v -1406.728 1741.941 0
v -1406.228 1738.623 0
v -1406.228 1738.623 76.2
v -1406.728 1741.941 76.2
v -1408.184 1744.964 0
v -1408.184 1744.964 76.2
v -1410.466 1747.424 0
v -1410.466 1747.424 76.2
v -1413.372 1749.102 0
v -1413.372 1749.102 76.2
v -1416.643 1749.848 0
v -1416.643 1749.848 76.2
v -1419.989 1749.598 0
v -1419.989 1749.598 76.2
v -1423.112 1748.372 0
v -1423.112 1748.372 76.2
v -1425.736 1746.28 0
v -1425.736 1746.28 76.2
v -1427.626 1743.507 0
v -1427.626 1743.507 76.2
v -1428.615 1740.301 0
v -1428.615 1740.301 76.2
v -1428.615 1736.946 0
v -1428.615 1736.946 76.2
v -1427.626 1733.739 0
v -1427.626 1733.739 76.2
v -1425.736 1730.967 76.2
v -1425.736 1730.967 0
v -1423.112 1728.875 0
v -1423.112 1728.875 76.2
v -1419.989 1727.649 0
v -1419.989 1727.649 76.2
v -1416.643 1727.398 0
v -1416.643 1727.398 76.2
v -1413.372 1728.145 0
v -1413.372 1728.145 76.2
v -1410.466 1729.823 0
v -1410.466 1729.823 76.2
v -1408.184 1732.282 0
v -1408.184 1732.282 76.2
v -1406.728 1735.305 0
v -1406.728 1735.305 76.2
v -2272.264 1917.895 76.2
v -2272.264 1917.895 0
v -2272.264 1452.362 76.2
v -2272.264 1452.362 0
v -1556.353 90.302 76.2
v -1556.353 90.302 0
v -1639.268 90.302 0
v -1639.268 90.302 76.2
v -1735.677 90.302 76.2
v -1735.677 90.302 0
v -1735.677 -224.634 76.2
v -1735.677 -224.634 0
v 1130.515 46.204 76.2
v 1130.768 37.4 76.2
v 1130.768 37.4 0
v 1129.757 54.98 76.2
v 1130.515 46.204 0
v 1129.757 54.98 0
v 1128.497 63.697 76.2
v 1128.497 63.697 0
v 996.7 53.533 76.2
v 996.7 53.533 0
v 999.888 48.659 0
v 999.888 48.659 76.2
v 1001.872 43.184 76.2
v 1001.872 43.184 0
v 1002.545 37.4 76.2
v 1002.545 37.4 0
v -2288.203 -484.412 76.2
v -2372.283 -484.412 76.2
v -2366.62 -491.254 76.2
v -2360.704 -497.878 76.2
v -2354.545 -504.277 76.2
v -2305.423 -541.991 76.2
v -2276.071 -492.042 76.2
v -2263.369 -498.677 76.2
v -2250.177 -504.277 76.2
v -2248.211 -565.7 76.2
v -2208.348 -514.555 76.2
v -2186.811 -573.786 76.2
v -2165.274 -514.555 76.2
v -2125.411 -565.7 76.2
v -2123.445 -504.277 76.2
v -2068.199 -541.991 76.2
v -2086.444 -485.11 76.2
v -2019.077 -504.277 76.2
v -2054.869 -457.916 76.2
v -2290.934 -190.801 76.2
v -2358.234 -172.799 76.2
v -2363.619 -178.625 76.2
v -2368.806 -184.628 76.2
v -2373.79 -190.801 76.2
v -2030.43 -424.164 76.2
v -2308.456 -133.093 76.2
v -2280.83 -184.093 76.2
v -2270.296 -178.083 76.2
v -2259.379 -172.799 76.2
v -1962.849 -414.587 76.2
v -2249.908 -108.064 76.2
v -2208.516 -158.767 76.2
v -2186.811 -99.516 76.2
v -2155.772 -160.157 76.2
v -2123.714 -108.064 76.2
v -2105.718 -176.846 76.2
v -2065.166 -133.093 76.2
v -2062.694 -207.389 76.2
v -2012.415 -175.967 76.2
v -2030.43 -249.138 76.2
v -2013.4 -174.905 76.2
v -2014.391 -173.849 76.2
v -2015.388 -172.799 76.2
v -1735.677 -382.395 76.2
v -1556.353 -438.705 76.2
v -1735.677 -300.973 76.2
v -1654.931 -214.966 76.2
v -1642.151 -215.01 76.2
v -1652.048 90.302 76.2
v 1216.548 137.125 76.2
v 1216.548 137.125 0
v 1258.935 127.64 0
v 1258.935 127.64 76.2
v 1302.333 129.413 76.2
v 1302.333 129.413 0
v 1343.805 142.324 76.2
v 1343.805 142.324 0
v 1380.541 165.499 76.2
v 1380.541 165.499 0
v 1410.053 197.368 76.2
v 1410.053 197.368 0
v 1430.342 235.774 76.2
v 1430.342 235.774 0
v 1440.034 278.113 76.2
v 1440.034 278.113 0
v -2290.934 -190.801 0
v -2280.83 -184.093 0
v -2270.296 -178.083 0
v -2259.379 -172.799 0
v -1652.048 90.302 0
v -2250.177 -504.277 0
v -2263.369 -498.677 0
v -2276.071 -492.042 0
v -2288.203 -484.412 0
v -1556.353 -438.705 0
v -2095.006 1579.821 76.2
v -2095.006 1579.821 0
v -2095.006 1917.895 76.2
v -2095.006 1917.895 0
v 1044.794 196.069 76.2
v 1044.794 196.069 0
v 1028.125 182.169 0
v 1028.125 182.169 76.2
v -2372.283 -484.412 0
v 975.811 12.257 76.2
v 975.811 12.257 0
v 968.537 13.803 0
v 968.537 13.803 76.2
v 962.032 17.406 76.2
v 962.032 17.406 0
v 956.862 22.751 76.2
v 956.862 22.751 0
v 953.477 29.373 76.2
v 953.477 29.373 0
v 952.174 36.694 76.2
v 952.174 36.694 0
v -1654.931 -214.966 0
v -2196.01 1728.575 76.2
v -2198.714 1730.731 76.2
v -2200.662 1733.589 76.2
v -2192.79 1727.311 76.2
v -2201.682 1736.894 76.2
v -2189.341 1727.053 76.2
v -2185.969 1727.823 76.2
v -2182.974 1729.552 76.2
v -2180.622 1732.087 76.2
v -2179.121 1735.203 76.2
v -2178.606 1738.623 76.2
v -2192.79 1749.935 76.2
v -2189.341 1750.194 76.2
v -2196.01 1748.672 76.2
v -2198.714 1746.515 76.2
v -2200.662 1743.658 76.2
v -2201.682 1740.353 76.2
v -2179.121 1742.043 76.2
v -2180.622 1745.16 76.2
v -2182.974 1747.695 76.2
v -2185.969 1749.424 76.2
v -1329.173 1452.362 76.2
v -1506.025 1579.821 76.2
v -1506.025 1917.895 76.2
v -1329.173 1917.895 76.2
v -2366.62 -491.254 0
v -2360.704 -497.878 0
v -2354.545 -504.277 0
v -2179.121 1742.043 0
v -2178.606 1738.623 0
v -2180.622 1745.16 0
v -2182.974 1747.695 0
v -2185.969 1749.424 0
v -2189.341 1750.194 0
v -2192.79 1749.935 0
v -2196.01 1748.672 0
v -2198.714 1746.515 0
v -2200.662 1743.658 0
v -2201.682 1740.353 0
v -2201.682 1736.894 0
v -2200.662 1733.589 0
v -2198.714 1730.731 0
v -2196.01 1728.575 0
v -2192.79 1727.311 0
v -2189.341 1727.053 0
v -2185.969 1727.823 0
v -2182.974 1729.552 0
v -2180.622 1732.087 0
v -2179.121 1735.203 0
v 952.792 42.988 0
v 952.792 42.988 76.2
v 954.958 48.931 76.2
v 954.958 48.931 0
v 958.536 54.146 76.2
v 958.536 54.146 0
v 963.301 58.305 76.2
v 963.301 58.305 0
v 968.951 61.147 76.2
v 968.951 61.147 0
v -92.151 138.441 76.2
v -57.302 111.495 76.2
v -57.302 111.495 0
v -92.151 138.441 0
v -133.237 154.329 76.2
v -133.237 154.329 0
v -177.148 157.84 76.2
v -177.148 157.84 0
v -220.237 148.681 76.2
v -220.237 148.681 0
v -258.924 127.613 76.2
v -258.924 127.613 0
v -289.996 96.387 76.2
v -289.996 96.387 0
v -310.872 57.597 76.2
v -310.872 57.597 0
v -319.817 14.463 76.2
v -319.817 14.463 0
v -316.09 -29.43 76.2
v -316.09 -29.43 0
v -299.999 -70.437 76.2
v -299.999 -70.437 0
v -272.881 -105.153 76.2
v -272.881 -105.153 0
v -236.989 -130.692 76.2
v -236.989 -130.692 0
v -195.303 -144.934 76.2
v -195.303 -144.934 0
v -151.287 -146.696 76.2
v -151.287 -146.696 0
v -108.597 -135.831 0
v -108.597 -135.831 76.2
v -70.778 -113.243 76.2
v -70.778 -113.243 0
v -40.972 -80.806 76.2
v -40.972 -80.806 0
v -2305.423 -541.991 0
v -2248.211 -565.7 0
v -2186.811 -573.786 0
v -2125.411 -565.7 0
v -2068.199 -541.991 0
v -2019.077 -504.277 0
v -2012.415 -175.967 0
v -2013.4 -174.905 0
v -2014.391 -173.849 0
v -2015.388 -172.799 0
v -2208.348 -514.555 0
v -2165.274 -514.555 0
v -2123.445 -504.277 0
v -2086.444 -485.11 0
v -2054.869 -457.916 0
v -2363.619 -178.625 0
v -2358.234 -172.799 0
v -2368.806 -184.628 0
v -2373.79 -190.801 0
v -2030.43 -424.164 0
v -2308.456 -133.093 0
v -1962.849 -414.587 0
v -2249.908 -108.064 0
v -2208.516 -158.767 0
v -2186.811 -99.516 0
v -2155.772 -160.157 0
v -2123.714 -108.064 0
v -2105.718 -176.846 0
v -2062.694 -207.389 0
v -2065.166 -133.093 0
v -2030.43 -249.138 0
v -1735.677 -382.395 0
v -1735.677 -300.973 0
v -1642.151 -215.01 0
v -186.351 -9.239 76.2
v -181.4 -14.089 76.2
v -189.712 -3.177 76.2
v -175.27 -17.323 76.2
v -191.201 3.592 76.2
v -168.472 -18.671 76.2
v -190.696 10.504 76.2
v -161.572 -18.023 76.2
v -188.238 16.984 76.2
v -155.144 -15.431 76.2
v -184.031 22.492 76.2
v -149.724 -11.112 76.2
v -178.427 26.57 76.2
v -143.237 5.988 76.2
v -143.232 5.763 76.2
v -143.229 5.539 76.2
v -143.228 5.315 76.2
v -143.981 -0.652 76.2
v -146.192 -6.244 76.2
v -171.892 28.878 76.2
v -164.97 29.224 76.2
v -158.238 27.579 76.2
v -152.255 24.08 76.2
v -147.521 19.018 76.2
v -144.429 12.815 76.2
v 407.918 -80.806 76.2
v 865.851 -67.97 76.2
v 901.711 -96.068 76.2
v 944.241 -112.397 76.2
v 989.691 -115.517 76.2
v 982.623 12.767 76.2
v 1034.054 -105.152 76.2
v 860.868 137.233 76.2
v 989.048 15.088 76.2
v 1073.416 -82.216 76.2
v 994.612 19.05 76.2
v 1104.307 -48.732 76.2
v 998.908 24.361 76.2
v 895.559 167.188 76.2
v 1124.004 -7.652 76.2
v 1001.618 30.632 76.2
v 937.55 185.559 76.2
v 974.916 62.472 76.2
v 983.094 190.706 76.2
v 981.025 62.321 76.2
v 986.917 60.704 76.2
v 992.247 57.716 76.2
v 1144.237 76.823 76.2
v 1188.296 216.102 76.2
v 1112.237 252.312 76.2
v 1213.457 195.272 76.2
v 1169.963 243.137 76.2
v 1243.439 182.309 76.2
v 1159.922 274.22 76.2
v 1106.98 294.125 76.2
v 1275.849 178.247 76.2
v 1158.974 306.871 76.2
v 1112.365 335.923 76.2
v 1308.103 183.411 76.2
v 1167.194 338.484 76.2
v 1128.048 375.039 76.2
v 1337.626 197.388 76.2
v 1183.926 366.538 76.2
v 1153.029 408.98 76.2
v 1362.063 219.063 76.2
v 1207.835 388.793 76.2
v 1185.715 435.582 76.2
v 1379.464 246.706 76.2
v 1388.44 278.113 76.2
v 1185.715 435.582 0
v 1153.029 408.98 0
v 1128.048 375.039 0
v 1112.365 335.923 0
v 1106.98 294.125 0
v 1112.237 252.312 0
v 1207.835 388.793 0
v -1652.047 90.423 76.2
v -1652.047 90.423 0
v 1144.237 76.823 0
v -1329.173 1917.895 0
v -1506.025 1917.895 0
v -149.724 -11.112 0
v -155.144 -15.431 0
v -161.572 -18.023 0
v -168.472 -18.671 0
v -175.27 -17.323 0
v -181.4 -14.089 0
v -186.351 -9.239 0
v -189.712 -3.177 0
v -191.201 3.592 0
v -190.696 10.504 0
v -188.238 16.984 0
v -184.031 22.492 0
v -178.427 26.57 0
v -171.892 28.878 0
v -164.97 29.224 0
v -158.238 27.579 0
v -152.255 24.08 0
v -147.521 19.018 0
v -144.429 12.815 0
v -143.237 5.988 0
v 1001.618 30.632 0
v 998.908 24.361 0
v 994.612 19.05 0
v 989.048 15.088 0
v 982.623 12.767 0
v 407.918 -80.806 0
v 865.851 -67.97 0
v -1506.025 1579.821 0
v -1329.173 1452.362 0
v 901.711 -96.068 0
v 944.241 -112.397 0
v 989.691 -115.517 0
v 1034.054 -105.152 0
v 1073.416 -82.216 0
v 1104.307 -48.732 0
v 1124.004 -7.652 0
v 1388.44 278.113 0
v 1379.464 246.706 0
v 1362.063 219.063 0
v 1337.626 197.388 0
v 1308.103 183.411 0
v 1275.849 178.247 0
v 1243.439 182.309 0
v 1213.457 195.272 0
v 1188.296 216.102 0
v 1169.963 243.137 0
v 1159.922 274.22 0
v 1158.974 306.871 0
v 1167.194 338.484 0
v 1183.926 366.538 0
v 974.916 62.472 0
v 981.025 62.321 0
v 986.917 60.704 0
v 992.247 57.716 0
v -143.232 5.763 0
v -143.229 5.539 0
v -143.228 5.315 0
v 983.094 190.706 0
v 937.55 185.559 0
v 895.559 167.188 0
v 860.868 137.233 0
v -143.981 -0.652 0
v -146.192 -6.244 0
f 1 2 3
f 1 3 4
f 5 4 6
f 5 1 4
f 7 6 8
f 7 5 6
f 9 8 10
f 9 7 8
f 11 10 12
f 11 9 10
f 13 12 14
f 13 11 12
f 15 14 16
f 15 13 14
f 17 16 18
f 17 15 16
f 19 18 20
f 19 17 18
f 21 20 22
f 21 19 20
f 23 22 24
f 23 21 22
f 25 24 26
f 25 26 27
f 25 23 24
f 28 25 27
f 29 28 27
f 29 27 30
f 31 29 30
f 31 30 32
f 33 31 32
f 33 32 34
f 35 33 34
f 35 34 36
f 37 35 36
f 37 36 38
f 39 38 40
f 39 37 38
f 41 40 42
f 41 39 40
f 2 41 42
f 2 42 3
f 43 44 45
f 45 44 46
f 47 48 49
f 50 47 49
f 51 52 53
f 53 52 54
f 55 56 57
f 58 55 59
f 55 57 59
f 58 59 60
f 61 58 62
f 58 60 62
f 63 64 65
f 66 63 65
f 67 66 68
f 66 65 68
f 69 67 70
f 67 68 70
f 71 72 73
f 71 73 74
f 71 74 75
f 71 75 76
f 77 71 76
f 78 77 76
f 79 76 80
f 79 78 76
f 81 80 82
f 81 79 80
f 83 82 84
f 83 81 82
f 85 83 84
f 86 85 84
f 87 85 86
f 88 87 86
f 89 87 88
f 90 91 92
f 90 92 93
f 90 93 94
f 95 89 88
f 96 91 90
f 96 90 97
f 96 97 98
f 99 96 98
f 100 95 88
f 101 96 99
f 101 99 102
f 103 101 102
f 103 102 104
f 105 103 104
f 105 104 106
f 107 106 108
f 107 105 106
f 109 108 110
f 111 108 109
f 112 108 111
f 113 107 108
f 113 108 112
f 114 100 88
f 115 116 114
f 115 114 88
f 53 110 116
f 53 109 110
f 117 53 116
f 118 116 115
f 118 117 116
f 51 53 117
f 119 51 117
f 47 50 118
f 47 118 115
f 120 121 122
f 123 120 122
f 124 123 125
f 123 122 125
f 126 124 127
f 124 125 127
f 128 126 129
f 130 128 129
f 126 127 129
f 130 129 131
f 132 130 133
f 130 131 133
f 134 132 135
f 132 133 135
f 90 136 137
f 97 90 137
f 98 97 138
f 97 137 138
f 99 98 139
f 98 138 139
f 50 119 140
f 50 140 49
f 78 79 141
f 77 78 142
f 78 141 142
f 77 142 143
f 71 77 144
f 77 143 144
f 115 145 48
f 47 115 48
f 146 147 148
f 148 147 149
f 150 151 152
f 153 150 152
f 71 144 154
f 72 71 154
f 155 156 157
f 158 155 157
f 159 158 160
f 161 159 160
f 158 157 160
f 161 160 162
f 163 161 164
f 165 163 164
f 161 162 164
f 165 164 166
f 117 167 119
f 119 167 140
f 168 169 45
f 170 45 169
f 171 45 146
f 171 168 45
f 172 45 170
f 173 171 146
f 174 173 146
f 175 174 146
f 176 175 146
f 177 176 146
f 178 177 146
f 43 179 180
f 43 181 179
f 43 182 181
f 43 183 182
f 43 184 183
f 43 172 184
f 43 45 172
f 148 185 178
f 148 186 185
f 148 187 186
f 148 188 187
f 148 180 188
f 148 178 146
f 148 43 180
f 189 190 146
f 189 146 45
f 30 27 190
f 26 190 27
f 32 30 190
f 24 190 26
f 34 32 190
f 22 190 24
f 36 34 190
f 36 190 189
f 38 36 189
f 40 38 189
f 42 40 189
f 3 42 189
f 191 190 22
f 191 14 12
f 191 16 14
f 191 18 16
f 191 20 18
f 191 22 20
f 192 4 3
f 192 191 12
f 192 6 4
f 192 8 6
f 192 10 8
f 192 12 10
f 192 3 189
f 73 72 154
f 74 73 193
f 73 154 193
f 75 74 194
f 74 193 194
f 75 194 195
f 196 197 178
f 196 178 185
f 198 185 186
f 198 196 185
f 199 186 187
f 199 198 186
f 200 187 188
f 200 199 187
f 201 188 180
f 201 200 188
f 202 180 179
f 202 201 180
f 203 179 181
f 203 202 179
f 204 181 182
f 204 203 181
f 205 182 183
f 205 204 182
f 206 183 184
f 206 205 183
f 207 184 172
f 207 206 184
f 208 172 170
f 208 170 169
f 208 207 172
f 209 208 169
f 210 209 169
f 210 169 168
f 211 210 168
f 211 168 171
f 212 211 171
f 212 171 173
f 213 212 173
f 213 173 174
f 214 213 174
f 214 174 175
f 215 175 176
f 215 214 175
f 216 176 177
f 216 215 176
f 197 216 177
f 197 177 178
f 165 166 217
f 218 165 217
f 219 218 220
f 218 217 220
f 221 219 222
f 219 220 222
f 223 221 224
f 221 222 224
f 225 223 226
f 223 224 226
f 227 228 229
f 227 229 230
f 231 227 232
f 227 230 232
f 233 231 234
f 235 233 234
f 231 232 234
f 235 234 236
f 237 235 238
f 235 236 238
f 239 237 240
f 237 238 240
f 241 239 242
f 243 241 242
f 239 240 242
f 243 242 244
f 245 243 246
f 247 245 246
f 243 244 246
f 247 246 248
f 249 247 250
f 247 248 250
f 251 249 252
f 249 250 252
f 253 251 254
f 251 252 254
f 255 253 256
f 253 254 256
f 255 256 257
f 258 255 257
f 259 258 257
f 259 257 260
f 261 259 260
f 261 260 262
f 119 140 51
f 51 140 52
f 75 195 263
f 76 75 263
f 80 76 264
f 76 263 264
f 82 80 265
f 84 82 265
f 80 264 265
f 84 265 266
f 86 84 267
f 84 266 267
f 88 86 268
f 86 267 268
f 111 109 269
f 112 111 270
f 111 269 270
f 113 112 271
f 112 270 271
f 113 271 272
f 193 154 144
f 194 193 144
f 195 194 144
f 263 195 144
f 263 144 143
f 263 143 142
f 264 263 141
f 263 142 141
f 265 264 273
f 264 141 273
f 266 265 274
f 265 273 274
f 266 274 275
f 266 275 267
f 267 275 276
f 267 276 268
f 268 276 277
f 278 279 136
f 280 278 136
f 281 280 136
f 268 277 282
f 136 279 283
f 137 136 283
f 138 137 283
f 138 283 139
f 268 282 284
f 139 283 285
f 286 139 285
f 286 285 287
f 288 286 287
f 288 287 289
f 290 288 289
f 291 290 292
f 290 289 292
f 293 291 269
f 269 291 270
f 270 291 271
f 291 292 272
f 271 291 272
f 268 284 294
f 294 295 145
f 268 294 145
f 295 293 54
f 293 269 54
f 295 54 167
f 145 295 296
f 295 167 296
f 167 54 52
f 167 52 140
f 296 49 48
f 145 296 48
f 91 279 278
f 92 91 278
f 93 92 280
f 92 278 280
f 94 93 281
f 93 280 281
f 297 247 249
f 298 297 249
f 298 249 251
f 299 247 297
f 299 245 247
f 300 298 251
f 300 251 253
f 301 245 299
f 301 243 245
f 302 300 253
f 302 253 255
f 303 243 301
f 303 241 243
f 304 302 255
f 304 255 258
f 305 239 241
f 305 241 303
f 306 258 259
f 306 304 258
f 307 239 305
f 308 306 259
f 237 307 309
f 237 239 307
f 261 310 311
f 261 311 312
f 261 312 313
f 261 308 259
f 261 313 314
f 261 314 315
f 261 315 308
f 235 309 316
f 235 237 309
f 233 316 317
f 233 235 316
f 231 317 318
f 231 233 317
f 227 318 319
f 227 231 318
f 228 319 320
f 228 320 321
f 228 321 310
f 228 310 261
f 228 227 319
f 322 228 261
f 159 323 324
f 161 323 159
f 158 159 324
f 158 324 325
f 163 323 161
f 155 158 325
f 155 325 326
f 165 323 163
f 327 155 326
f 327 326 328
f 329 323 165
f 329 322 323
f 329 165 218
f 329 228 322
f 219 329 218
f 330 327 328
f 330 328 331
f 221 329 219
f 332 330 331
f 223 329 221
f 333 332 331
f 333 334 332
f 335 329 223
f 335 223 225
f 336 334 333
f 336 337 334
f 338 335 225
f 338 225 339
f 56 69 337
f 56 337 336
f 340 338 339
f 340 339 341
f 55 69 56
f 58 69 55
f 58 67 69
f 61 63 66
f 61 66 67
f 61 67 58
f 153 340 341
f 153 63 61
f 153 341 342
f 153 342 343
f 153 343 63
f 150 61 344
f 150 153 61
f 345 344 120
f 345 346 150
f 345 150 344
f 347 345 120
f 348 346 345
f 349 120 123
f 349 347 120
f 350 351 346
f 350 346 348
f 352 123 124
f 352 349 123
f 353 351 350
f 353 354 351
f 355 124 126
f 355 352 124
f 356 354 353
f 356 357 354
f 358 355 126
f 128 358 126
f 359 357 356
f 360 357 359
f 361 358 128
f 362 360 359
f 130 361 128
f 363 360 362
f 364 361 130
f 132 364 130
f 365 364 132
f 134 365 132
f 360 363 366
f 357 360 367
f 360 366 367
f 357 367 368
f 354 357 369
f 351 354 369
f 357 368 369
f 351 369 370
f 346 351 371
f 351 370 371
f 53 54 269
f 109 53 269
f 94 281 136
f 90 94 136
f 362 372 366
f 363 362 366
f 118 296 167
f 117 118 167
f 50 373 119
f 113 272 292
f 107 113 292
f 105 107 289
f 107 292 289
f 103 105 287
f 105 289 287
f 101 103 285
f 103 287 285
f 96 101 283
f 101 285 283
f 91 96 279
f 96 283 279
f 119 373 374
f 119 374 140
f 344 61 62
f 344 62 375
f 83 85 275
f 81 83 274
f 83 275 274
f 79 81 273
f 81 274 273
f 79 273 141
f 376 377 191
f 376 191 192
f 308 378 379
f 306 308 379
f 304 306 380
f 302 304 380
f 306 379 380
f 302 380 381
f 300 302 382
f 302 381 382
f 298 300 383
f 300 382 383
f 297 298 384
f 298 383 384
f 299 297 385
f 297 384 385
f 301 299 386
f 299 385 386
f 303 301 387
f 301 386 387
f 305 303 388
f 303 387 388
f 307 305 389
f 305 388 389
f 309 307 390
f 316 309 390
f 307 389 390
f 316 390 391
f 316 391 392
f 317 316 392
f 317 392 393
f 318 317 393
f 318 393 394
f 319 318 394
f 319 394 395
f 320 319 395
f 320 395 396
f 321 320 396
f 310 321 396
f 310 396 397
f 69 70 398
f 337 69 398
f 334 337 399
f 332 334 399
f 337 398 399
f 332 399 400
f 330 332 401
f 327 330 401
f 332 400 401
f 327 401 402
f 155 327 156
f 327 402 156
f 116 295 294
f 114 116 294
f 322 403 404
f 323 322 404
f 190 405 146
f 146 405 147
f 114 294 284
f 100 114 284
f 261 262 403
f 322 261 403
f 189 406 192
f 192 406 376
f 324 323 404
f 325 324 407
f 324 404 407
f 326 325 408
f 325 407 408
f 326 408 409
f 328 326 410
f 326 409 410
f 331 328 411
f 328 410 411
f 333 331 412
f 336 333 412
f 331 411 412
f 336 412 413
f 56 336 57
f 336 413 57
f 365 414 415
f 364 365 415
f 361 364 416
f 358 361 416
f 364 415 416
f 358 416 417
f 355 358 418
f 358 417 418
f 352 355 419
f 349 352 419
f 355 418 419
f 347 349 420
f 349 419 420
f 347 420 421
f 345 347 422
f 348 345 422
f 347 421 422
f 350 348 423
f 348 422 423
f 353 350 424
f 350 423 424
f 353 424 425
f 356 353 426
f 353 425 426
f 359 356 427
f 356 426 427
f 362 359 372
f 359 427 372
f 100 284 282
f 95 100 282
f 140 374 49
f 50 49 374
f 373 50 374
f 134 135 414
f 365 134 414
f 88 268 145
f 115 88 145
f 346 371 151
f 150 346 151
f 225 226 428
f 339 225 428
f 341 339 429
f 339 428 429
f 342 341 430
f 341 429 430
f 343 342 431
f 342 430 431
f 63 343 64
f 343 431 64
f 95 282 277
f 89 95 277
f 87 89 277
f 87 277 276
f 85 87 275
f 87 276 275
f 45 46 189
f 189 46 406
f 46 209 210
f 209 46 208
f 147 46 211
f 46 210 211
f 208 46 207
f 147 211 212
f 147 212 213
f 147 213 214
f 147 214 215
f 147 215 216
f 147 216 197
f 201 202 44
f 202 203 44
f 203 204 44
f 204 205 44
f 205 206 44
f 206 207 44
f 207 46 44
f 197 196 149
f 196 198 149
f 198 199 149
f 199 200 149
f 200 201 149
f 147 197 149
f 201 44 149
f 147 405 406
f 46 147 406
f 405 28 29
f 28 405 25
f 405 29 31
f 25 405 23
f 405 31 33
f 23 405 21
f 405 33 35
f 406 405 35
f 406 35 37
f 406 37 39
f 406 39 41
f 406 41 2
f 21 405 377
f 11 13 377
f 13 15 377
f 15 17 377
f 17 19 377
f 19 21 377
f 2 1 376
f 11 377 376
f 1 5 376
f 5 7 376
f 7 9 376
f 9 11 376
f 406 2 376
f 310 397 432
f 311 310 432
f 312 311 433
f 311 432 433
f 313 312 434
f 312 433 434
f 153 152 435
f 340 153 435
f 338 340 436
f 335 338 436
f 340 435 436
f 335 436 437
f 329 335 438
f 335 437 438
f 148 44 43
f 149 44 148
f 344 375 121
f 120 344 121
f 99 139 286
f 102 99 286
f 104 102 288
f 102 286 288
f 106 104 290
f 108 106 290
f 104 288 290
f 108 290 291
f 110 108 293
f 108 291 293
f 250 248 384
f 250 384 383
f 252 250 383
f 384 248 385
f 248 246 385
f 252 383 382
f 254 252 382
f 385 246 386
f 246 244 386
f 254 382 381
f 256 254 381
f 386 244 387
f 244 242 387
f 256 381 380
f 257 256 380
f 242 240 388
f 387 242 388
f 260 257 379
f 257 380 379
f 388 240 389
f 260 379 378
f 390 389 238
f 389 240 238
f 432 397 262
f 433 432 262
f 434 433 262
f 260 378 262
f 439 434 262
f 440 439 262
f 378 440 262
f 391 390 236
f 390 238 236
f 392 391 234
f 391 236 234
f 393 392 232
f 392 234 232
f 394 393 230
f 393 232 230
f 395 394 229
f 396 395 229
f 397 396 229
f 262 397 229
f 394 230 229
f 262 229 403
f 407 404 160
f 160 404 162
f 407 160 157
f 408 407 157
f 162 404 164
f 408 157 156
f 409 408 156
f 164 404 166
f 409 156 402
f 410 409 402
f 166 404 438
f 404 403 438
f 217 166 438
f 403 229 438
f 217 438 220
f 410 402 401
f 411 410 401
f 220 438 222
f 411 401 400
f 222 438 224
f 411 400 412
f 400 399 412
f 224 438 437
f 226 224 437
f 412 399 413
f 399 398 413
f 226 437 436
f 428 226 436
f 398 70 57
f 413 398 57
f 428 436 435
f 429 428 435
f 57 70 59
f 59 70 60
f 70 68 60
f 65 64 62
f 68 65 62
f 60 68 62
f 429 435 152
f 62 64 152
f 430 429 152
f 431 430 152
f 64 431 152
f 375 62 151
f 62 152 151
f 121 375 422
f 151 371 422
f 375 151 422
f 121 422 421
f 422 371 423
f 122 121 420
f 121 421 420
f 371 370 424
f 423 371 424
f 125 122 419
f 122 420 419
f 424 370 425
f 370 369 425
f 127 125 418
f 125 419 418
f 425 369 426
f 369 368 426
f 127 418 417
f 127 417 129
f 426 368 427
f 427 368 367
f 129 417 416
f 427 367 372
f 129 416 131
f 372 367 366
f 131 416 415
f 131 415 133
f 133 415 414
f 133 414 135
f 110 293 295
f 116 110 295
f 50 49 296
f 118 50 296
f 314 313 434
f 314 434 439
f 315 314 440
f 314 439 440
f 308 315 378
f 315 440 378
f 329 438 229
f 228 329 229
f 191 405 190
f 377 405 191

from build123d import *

# Parameters (mm, degrees)
F1_DEPTH = 76.2
F3_DEPTH = 76.2
F4_W     = 177.2577762604
F4_H     = 338.0736112595
F4_R     = 11.6028695054
F4_W_2   = 176.8524646759
F4_R_2   = 11.2564054706
F5_DEPTH = 76.2


with BuildPart() as f1:
    # F0 (on Top) → F1 (new body)
    with BuildSketch(Plane.XY):
        with BuildLine():
            ThreePointArc((1095.1752997667, 135.6541007105), (1116.5658010686, 101.8658208669), (1128.4971752627, 63.6971987989))
            Line((1128.4971752627, 63.6971987989), (1144.2365622902, 76.8227564091))
            Line((1144.2365622902, 76.8227564091), (1095.1752997667, 135.6541007105))
        make_face()
        with BuildLine():
            Line((1044.7935983844, 196.0688366559), (1028.1251670589, 182.1685205093))
            ThreePointArc((1028.1251670589, 182.1685205093), (1064.7997301472, 163.4512828361), (1095.1752997667, 135.6541007105))
            Line((1095.1752997667, 135.6541007105), (1044.7935983844, 196.0688366559))
        make_face()
        with BuildLine():
            ThreePointArc((-57.3019543636, 111.4951995236), (-26.3466717807, 64.5549196275), (-14.4595607319, 9.5975180566))
            Line((-14.4595607319, 9.5975180566), (405.0544798374, 21.357185673))
            Line((405.0544798374, 21.357185673), (402.1667251813, 124.3748612966))
            Line((402.1667251813, 124.3748612966), (-57.3019543636, 111.4951995236))
        make_face()
        with BuildLine():
            ThreePointArc((-57.3019543636, 111.4951995236), (-319.5433148438, -7.618457824), (-40.9717080637, -80.806260149))
            Line((-40.9717080637, -80.806260149), (-155.3050279617, -80.806260149))
            Line((-155.3050279617, -80.806260149), (-149.7238150028, -11.1118043692))
            ThreePointArc((-149.7238150028, -11.1118043692), (-191.1863363383, 7.2318864204), (-147.3329769737, 18.7433824014))
            Line((-147.3329769737, 18.7433824014), (-140.0911494629, 109.1744824022))
            Line((-140.0911494629, 109.1744824022), (-57.3019543636, 111.4951995236))
        make_face()
        with BuildLine():
            ThreePointArc((-14.4595607319, 9.5975180566), (-14.4145496581, 7.4563077804), (-14.3995449849, 5.3146770224))
            ThreePointArc((-14.3995449849, 5.3146770224), (-21.193584075, -39.7488771815), (-40.9717080637, -80.806260149))
            Line((-40.9717080637, -80.806260149), (407.9182890291, -80.806260149))
            Line((407.9182890291, -80.806260149), (405.0544798374, 21.357185673))
            Line((405.0544798374, 21.357185673), (-14.4595607319, 9.5975180566))
        make_face()
        with BuildLine():
            Line((402.1667251813, 124.3748612966), (405.0544798374, 21.357185673))
            Line((405.0544798374, 21.357185673), (824.001286806, 33.1009527998))
            ThreePointArc((824.001286806, 33.1009527998), (832.7371617864, 88.6003982795), (860.8684888632, 137.2330251583))
            Line((860.8684888632, 137.2330251583), (402.1667251813, 124.3748612966))
        make_face()
        with BuildLine():
            Line((824.001286806, 33.1009527998), (405.0544798374, 21.357185673))
            Line((405.0544798374, 21.357185673), (407.9182890291, -80.806260149))
            Line((407.9182890291, -80.806260149), (865.8511996058, -67.9696485027))
            ThreePointArc((865.8511996058, -67.9696485027), (835.6115621661, -21.2912417875), (824.001286806, 33.1009527998))
        make_face()
        with BuildLine():
            Line((1095.1752997667, 35.909064754), (1128.4971752627, 63.6971987989))
            ThreePointArc((1128.4971752627, 63.6971987989), (1116.5658010686, 101.8658208669), (1095.1752997667, 135.6541007105))
            Line((1095.1752997667, 135.6541007105), (1046.1140372432, 94.7404090553))
            Line((1046.1140372432, 94.7404090553), (1095.1752997667, 35.909064754))
        make_face()
        with BuildLine():
            Line((1044.7935983844, 196.0688366559), (1095.1752997667, 135.6541007105))
            Line((1095.1752997667, 135.6541007105), (1150.335278326, 181.6536987314))
            ThreePointArc((1150.335278326, 181.6536987314), (1126.9745407391, 214.6579417894), (1112.2365223529, 252.3115596035))
            Line((1112.2365223529, 252.3115596035), (1044.7935983844, 196.0688366559))
        make_face()
        with BuildLine():
            Line((1150.335278326, 181.6536987314), (1095.1752997667, 135.6541007105))
            Line((1095.1752997667, 135.6541007105), (1144.2365622902, 76.8227564091))
            Line((1144.2365622902, 76.8227564091), (1216.5479707423, 137.1254578967))
            ThreePointArc((1216.5479707423, 137.1254578967), (1180.7414315667, 155.3744399868), (1150.335278326, 181.6536987314))
        make_face()
        with BuildLine():
            Line((-143.2374652301, 5.9876618736), (-14.4595607319, 9.5975180566))
            ThreePointArc((-14.4595607319, 9.5975180566), (-26.3466717807, 64.5549196275), (-57.3019543636, 111.4951995236))
            Line((-57.3019543636, 111.4951995236), (-140.0911494629, 109.1744824022))
            Line((-140.0911494629, 109.1744824022), (-147.3329769737, 18.7433824014))
            ThreePointArc((-147.3329769737, 18.7433824014), (-144.3778167398, 12.6568647718), (-143.2374652301, 5.9876618736))
        make_face()
        with BuildLine():
            ThreePointArc((-40.9717080637, -80.806260149), (-21.193584075, -39.7488771815), (-14.3995449849, 5.3146770224))
            ThreePointArc((-14.3995449849, 5.3146770224), (-14.4145496581, 7.4563077804), (-14.4595607319, 9.5975180566))
            Line((-14.4595607319, 9.5975180566), (-143.2374652301, 5.9876618736))
            ThreePointArc((-143.2374652301, 5.9876618736), (-143.2303924084, 5.6512024842), (-143.2280346469, 5.3146770224))
            ThreePointArc((-143.2280346469, 5.3146770224), (-144.9109403889, -3.5174299366), (-149.7238150028, -11.1118043692))
            Line((-149.7238150028, -11.1118043692), (-155.3050279617, -80.806260149))
            Line((-155.3050279617, -80.806260149), (-40.9717080637, -80.806260149))
        make_face()
        with BuildLine():
            ThreePointArc((860.8684888632, 137.2330251583), (832.7371617864, 88.6003982795), (824.001286806, 33.1009527998))
            Line((824.001286806, 33.1009527998), (952.1741089641, 36.693847531))
            ThreePointArc((952.1741089641, 36.693847531), (956.5830422673, 51.6508895134), (968.9513483855, 61.1470361793))
            Line((968.9513483855, 61.1470361793), (960.3673065373, 122.327812016))
            Line((960.3673065373, 122.327812016), (960.3673065373, 140.0221404463))
            Line((960.3673065373, 140.0221404463), (860.8684888632, 137.2330251583))
        make_face()
        with BuildLine():
            Line((952.1741089641, 36.693847531), (824.001286806, 33.1009527998))
            ThreePointArc((824.001286806, 33.1009527998), (835.6115621661, -21.2912417875), (865.8511996058, -67.9696485027))
            Line((865.8511996058, -67.9696485027), (986.5923425929, -64.5850759453))
            Line((986.5923425929, -64.5850759453), (975.8109543977, 12.2567785152))
            ThreePointArc((975.8109543977, 12.2567785152), (959.2482829239, 19.886420857), (952.1741089641, 36.693847531))
        make_face()
        with BuildLine():
            Line((986.5923425929, -64.5850759453), (865.8511996058, -67.9696485027))
            ThreePointArc((865.8511996058, -67.9696485027), (1034.0535832989, -105.151655125), (1130.767885586, 37.3996943235))
            ThreePointArc((1130.767885586, 37.3996943235), (1130.1991538085, 50.5973727842), (1128.4971752627, 63.6971987989))
            Line((1128.4971752627, 63.6971987989), (1095.1752997667, 35.909064754))
            Line((1095.1752997667, 35.909064754), (1046.1140372432, 94.7404090553))
            Line((1046.1140372432, 94.7404090553), (996.7004677166, 53.5329177841))
            ThreePointArc((996.7004677166, 53.5329177841), (1001.0386306557, 45.9792650674), (1002.544715946, 37.3996943235))
            ThreePointArc((1002.544715946, 37.3996943235), (994.6123228298, 19.049897173), (975.8109543977, 12.2567785152))
            Line((975.8109543977, 12.2567785152), (986.5923425929, -64.5850759453))
        make_face()
        with BuildLine():
            ThreePointArc((1112.2365223529, 252.3115596035), (1126.9745407391, 214.6579417894), (1150.335278326, 181.6536987314))
            Line((1150.335278326, 181.6536987314), (1189.7543229351, 214.5264491157))
            ThreePointArc((1189.7543229351, 214.5264491157), (1158.8582295045, 305.8033531838), (1207.8354615505, 388.7929461858))
            Line((1207.8354615505, 388.7929461858), (1185.7147954199, 435.5819454318))
            ThreePointArc((1185.7147954199, 435.5819454318), (1118.9667129191, 355.9781863812), (1112.2365223529, 252.3115596035))
        make_face()
        with BuildLine():
            Line((1189.7543229351, 214.5264491157), (1150.335278326, 181.6536987314))
            ThreePointArc((1150.335278326, 181.6536987314), (1180.7414315667, 155.3744399868), (1216.5479707423, 137.1254578967))
            ThreePointArc((1216.5479707423, 137.1254578967), (1362.9301215678, 152.7114001502), (1440.033993001, 278.1133486449))
            Line((1440.033993001, 278.1133486449), (1388.4400421367, 278.1133486449))
            ThreePointArc((1388.4400421367, 278.1133486449), (1309.127275122, 183.7332123048), (1189.7543229351, 214.5264491157))
        make_face()
        with BuildLine():
            ThreePointArc((1028.1251670589, 182.1685205093), (937.5496415387, 185.5592465132), (860.8684888632, 137.2330251583))
            Line((860.8684888632, 137.2330251583), (960.3673065373, 140.0221404463))
            Line((960.3673065373, 140.0221404463), (960.3673065373, 122.327812016))
            Line((960.3673065373, 122.327812016), (968.9513483855, 61.1470361793))
            ThreePointArc((968.9513483855, 61.1470361793), (984.0200777527, 61.6920445269), (996.7004677166, 53.5329177841))
            Line((996.7004677166, 53.5329177841), (1046.1140372432, 94.7404090553))
            Line((1046.1140372432, 94.7404090553), (1095.1752997667, 135.6541007105))
            ThreePointArc((1095.1752997667, 135.6541007105), (1064.7997301472, 163.4512828361), (1028.1251670589, 182.1685205093))
        make_face()
    extrude(amount=F1_DEPTH)


with BuildPart() as f3:
    # F2 (on Top) → F3 (new body)
    with BuildSketch(Plane.XY):
        Polygon((-1652.0482970075, 90.3020948172), (-1646.0153460503, 90.3020948172), (-1639.2679214478, 90.3020948172), (-1652.0471572876, 90.4227793217), align=None)
    extrude(amount=F3_DEPTH)


with BuildPart() as f3b:
    # F2 (on Top) → F3, piece 2 (new body)
    with BuildSketch(Plane.XY):
        Polygon((-1556.3532114029, -438.7048780918), (-1556.3532114029, -356.9832097116), (-1735.6774806976, -382.3950311785), (-1735.6774806976, -438.7048780918), align=None)
        with BuildLine():
            Line((-2030.4295234081, -172.798871994), (-2012.4154545584, -175.9668304321))
            ThreePointArc((-2012.4154545584, -175.9668304321), (-2013.8946997096, -174.3760426155), (-2015.3884550194, -172.798871994))
            Line((-2015.3884550194, -172.798871994), (-2030.4295234081, -172.798871994))
        make_face()
        with BuildLine():
            Line((-2019.0768241882, -504.2768716812), (-1556.3532114029, -438.7048780918))
            Line((-1556.3532114029, -438.7048780918), (-1735.6774806976, -438.7048780918))
            Line((-1735.6774806976, -438.7048780918), (-1735.6774806976, -382.3950311785))
            Line((-1735.6774806976, -382.3950311785), (-1962.8486229975, -414.587174123))
            ThreePointArc((-1962.8486229975, -414.5871741231), (-1985.8940820433, -462.6096520454), (-2019.0768241882, -504.2768716812))
        make_face()
        with BuildLine():
            Line((-1735.6774806976, -300.9731173515), (-1735.6774806976, -224.6340364218))
            Line((-1735.6774806976, -224.6340364218), (-2012.4154545584, -175.9668304321))
            ThreePointArc((-2012.4154545584, -175.9668304321), (-1982.7165245575, -215.9089130519), (-1962.0091323813, -261.1703791844))
            Line((-1962.0091323813, -261.1703791844), (-1735.6774806976, -300.9731173515))
        make_face()
        with BuildLine():
            Line((-2030.4295234081, -424.1639803332), (-2019.0768241882, -504.2768716812))
            ThreePointArc((-2019.0768241882, -504.2768716812), (-1985.8940820433, -462.6096520454), (-1962.8486229975, -414.5871741231))
            Line((-1962.8486229975, -414.587174123), (-2030.4295234081, -424.1639803332))
        make_face()
        with BuildLine():
            Line((-2123.4450143506, -504.2768716812), (-2019.0768241882, -504.2768716812))
            Line((-2019.0768241882, -504.2768716812), (-2030.4295234081, -424.1639803332))
            ThreePointArc((-2030.4295234081, -424.1639803332), (-2069.8633375497, -472.4336509258), (-2123.4450143506, -504.2768716812))
        make_face()
        with BuildLine():
            Line((-2259.37945677, -172.798871994), (-2358.2335277076, -172.798871994))
            ThreePointArc((-2358.2335277076, -172.798871994), (-2366.2375797297, -181.6048629367), (-2373.7897872925, -190.8013017139))
            Line((-2373.7897872925, -190.8013017139), (-2290.9338338711, -190.8013017139))
            ThreePointArc((-2290.9338338711, -190.8013017139), (-2275.6140118192, -180.9984220123), (-2259.37945677, -172.798871994))
        make_face()
        with BuildLine():
            ThreePointArc((-2372.282743454, -484.4123420255), (-2363.6930289923, -494.5938032721), (-2354.5451585388, -504.2768716812))
            Line((-2354.5451585388, -504.2768716812), (-2250.1769683764, -504.2768716812))
            ThreePointArc((-2250.1769683764, -504.2768716812), (-2269.7864030039, -495.486643196), (-2288.2026430333, -484.4123420255))
            Line((-2288.2026430333, -484.4123420255), (-2372.282743454, -484.4123420255))
        make_face()
        with BuildLine():
            ThreePointArc((-2354.5451585388, -504.2768716812), (-2186.8109913635, -573.7863601966), (-2019.0768241882, -504.2768716812))
            Line((-2019.0768241882, -504.2768716812), (-2123.4450143506, -504.2768716812))
            ThreePointArc((-2123.4450143506, -504.2768716812), (-2186.8109913635, -515.8538993264), (-2250.1769683764, -504.2768716812))
            Line((-2250.1769683764, -504.2768716812), (-2354.5451585388, -504.2768716812))
        make_face()
        Polygon((-1556.3532114029, 90.3020948172), (-1639.2679214478, 90.3020948172), (-1642.1512293129, -215.0102678422), (-1654.9311892219, -214.9662547422), (-1652.0482970075, 90.3020948172), (-1735.6774806976, 90.3020948172), (-1735.6774806976, -224.6340364218), (-1735.6774806976, -300.9731173515), (-1735.6774806976, -382.3950311785), (-1556.3532114029, -356.9832097116), align=None)
        with BuildLine():
            ThreePointArc((-1962.0091323813, -261.1703791844), (-1982.7165245575, -215.9089130519), (-2012.4154545584, -175.9668304321))
            Line((-2012.4154545584, -175.9668304321), (-2030.4295234081, -172.798871994))
            Line((-2030.4295234081, -172.798871994), (-2030.4295234081, -249.1379529238))
            Line((-2030.4295234081, -249.1379529238), (-1962.0091323813, -261.1703791844))
        make_face()
        with BuildLine():
            Line((-2114.242525957, -172.798871994), (-2030.4295234081, -172.798871994))
            Line((-2030.4295234081, -172.798871994), (-2015.3884550194, -172.798871994))
            ThreePointArc((-2015.3884550194, -172.798871994), (-2186.8109913635, -99.5155730603), (-2358.2335277076, -172.798871994))
            Line((-2358.2335277076, -172.798871994), (-2259.37945677, -172.798871994))
            ThreePointArc((-2259.37945677, -172.798871994), (-2186.8109913635, -157.4480339305), (-2114.242525957, -172.798871994))
        make_face()
        with BuildLine():
            Line((-2030.4295234081, -249.1379529238), (-2030.4295234081, -172.798871994))
            Line((-2030.4295234081, -172.798871994), (-2114.242525957, -172.798871994))
            ThreePointArc((-2114.242525957, -172.798871994), (-2066.140233448, -204.1660268366), (-2030.4295234081, -249.1379529238))
        make_face()
    extrude(amount=F3_DEPTH)


with BuildPart() as f5:
    # F4 (on Top) → F5 (new body)
    with BuildSketch(Plane.XY):
        with Locations((-2183.6353540421, 1748.8577961922)):
            Rectangle(F4_W, F4_H)
        with Locations((-2190.2084350586, 1738.623380661)):
            Circle(F4_R, mode=Mode.SUBTRACT)
        Polygon((-1506.0250759125, 1579.8209905624), (-2095.0064659119, 1579.8209905624), (-2272.2642421722, 1579.8209905624), (-2272.2642421722, 1452.3619413376), (-1329.1726112366, 1452.3619413376), (-1329.1726112366, 1579.8209905624), align=None)
        with Locations((-1417.5988435745, 1748.8577961922)):
            Rectangle(F4_W_2, F4_H)
        with Locations((-1417.4840450287, 1738.623380661)):
            Circle(F4_R_2, mode=Mode.SUBTRACT)
    extrude(amount=F5_DEPTH)


solid = Compound([f1.part, f3.part, f3b.part, f5.part])
